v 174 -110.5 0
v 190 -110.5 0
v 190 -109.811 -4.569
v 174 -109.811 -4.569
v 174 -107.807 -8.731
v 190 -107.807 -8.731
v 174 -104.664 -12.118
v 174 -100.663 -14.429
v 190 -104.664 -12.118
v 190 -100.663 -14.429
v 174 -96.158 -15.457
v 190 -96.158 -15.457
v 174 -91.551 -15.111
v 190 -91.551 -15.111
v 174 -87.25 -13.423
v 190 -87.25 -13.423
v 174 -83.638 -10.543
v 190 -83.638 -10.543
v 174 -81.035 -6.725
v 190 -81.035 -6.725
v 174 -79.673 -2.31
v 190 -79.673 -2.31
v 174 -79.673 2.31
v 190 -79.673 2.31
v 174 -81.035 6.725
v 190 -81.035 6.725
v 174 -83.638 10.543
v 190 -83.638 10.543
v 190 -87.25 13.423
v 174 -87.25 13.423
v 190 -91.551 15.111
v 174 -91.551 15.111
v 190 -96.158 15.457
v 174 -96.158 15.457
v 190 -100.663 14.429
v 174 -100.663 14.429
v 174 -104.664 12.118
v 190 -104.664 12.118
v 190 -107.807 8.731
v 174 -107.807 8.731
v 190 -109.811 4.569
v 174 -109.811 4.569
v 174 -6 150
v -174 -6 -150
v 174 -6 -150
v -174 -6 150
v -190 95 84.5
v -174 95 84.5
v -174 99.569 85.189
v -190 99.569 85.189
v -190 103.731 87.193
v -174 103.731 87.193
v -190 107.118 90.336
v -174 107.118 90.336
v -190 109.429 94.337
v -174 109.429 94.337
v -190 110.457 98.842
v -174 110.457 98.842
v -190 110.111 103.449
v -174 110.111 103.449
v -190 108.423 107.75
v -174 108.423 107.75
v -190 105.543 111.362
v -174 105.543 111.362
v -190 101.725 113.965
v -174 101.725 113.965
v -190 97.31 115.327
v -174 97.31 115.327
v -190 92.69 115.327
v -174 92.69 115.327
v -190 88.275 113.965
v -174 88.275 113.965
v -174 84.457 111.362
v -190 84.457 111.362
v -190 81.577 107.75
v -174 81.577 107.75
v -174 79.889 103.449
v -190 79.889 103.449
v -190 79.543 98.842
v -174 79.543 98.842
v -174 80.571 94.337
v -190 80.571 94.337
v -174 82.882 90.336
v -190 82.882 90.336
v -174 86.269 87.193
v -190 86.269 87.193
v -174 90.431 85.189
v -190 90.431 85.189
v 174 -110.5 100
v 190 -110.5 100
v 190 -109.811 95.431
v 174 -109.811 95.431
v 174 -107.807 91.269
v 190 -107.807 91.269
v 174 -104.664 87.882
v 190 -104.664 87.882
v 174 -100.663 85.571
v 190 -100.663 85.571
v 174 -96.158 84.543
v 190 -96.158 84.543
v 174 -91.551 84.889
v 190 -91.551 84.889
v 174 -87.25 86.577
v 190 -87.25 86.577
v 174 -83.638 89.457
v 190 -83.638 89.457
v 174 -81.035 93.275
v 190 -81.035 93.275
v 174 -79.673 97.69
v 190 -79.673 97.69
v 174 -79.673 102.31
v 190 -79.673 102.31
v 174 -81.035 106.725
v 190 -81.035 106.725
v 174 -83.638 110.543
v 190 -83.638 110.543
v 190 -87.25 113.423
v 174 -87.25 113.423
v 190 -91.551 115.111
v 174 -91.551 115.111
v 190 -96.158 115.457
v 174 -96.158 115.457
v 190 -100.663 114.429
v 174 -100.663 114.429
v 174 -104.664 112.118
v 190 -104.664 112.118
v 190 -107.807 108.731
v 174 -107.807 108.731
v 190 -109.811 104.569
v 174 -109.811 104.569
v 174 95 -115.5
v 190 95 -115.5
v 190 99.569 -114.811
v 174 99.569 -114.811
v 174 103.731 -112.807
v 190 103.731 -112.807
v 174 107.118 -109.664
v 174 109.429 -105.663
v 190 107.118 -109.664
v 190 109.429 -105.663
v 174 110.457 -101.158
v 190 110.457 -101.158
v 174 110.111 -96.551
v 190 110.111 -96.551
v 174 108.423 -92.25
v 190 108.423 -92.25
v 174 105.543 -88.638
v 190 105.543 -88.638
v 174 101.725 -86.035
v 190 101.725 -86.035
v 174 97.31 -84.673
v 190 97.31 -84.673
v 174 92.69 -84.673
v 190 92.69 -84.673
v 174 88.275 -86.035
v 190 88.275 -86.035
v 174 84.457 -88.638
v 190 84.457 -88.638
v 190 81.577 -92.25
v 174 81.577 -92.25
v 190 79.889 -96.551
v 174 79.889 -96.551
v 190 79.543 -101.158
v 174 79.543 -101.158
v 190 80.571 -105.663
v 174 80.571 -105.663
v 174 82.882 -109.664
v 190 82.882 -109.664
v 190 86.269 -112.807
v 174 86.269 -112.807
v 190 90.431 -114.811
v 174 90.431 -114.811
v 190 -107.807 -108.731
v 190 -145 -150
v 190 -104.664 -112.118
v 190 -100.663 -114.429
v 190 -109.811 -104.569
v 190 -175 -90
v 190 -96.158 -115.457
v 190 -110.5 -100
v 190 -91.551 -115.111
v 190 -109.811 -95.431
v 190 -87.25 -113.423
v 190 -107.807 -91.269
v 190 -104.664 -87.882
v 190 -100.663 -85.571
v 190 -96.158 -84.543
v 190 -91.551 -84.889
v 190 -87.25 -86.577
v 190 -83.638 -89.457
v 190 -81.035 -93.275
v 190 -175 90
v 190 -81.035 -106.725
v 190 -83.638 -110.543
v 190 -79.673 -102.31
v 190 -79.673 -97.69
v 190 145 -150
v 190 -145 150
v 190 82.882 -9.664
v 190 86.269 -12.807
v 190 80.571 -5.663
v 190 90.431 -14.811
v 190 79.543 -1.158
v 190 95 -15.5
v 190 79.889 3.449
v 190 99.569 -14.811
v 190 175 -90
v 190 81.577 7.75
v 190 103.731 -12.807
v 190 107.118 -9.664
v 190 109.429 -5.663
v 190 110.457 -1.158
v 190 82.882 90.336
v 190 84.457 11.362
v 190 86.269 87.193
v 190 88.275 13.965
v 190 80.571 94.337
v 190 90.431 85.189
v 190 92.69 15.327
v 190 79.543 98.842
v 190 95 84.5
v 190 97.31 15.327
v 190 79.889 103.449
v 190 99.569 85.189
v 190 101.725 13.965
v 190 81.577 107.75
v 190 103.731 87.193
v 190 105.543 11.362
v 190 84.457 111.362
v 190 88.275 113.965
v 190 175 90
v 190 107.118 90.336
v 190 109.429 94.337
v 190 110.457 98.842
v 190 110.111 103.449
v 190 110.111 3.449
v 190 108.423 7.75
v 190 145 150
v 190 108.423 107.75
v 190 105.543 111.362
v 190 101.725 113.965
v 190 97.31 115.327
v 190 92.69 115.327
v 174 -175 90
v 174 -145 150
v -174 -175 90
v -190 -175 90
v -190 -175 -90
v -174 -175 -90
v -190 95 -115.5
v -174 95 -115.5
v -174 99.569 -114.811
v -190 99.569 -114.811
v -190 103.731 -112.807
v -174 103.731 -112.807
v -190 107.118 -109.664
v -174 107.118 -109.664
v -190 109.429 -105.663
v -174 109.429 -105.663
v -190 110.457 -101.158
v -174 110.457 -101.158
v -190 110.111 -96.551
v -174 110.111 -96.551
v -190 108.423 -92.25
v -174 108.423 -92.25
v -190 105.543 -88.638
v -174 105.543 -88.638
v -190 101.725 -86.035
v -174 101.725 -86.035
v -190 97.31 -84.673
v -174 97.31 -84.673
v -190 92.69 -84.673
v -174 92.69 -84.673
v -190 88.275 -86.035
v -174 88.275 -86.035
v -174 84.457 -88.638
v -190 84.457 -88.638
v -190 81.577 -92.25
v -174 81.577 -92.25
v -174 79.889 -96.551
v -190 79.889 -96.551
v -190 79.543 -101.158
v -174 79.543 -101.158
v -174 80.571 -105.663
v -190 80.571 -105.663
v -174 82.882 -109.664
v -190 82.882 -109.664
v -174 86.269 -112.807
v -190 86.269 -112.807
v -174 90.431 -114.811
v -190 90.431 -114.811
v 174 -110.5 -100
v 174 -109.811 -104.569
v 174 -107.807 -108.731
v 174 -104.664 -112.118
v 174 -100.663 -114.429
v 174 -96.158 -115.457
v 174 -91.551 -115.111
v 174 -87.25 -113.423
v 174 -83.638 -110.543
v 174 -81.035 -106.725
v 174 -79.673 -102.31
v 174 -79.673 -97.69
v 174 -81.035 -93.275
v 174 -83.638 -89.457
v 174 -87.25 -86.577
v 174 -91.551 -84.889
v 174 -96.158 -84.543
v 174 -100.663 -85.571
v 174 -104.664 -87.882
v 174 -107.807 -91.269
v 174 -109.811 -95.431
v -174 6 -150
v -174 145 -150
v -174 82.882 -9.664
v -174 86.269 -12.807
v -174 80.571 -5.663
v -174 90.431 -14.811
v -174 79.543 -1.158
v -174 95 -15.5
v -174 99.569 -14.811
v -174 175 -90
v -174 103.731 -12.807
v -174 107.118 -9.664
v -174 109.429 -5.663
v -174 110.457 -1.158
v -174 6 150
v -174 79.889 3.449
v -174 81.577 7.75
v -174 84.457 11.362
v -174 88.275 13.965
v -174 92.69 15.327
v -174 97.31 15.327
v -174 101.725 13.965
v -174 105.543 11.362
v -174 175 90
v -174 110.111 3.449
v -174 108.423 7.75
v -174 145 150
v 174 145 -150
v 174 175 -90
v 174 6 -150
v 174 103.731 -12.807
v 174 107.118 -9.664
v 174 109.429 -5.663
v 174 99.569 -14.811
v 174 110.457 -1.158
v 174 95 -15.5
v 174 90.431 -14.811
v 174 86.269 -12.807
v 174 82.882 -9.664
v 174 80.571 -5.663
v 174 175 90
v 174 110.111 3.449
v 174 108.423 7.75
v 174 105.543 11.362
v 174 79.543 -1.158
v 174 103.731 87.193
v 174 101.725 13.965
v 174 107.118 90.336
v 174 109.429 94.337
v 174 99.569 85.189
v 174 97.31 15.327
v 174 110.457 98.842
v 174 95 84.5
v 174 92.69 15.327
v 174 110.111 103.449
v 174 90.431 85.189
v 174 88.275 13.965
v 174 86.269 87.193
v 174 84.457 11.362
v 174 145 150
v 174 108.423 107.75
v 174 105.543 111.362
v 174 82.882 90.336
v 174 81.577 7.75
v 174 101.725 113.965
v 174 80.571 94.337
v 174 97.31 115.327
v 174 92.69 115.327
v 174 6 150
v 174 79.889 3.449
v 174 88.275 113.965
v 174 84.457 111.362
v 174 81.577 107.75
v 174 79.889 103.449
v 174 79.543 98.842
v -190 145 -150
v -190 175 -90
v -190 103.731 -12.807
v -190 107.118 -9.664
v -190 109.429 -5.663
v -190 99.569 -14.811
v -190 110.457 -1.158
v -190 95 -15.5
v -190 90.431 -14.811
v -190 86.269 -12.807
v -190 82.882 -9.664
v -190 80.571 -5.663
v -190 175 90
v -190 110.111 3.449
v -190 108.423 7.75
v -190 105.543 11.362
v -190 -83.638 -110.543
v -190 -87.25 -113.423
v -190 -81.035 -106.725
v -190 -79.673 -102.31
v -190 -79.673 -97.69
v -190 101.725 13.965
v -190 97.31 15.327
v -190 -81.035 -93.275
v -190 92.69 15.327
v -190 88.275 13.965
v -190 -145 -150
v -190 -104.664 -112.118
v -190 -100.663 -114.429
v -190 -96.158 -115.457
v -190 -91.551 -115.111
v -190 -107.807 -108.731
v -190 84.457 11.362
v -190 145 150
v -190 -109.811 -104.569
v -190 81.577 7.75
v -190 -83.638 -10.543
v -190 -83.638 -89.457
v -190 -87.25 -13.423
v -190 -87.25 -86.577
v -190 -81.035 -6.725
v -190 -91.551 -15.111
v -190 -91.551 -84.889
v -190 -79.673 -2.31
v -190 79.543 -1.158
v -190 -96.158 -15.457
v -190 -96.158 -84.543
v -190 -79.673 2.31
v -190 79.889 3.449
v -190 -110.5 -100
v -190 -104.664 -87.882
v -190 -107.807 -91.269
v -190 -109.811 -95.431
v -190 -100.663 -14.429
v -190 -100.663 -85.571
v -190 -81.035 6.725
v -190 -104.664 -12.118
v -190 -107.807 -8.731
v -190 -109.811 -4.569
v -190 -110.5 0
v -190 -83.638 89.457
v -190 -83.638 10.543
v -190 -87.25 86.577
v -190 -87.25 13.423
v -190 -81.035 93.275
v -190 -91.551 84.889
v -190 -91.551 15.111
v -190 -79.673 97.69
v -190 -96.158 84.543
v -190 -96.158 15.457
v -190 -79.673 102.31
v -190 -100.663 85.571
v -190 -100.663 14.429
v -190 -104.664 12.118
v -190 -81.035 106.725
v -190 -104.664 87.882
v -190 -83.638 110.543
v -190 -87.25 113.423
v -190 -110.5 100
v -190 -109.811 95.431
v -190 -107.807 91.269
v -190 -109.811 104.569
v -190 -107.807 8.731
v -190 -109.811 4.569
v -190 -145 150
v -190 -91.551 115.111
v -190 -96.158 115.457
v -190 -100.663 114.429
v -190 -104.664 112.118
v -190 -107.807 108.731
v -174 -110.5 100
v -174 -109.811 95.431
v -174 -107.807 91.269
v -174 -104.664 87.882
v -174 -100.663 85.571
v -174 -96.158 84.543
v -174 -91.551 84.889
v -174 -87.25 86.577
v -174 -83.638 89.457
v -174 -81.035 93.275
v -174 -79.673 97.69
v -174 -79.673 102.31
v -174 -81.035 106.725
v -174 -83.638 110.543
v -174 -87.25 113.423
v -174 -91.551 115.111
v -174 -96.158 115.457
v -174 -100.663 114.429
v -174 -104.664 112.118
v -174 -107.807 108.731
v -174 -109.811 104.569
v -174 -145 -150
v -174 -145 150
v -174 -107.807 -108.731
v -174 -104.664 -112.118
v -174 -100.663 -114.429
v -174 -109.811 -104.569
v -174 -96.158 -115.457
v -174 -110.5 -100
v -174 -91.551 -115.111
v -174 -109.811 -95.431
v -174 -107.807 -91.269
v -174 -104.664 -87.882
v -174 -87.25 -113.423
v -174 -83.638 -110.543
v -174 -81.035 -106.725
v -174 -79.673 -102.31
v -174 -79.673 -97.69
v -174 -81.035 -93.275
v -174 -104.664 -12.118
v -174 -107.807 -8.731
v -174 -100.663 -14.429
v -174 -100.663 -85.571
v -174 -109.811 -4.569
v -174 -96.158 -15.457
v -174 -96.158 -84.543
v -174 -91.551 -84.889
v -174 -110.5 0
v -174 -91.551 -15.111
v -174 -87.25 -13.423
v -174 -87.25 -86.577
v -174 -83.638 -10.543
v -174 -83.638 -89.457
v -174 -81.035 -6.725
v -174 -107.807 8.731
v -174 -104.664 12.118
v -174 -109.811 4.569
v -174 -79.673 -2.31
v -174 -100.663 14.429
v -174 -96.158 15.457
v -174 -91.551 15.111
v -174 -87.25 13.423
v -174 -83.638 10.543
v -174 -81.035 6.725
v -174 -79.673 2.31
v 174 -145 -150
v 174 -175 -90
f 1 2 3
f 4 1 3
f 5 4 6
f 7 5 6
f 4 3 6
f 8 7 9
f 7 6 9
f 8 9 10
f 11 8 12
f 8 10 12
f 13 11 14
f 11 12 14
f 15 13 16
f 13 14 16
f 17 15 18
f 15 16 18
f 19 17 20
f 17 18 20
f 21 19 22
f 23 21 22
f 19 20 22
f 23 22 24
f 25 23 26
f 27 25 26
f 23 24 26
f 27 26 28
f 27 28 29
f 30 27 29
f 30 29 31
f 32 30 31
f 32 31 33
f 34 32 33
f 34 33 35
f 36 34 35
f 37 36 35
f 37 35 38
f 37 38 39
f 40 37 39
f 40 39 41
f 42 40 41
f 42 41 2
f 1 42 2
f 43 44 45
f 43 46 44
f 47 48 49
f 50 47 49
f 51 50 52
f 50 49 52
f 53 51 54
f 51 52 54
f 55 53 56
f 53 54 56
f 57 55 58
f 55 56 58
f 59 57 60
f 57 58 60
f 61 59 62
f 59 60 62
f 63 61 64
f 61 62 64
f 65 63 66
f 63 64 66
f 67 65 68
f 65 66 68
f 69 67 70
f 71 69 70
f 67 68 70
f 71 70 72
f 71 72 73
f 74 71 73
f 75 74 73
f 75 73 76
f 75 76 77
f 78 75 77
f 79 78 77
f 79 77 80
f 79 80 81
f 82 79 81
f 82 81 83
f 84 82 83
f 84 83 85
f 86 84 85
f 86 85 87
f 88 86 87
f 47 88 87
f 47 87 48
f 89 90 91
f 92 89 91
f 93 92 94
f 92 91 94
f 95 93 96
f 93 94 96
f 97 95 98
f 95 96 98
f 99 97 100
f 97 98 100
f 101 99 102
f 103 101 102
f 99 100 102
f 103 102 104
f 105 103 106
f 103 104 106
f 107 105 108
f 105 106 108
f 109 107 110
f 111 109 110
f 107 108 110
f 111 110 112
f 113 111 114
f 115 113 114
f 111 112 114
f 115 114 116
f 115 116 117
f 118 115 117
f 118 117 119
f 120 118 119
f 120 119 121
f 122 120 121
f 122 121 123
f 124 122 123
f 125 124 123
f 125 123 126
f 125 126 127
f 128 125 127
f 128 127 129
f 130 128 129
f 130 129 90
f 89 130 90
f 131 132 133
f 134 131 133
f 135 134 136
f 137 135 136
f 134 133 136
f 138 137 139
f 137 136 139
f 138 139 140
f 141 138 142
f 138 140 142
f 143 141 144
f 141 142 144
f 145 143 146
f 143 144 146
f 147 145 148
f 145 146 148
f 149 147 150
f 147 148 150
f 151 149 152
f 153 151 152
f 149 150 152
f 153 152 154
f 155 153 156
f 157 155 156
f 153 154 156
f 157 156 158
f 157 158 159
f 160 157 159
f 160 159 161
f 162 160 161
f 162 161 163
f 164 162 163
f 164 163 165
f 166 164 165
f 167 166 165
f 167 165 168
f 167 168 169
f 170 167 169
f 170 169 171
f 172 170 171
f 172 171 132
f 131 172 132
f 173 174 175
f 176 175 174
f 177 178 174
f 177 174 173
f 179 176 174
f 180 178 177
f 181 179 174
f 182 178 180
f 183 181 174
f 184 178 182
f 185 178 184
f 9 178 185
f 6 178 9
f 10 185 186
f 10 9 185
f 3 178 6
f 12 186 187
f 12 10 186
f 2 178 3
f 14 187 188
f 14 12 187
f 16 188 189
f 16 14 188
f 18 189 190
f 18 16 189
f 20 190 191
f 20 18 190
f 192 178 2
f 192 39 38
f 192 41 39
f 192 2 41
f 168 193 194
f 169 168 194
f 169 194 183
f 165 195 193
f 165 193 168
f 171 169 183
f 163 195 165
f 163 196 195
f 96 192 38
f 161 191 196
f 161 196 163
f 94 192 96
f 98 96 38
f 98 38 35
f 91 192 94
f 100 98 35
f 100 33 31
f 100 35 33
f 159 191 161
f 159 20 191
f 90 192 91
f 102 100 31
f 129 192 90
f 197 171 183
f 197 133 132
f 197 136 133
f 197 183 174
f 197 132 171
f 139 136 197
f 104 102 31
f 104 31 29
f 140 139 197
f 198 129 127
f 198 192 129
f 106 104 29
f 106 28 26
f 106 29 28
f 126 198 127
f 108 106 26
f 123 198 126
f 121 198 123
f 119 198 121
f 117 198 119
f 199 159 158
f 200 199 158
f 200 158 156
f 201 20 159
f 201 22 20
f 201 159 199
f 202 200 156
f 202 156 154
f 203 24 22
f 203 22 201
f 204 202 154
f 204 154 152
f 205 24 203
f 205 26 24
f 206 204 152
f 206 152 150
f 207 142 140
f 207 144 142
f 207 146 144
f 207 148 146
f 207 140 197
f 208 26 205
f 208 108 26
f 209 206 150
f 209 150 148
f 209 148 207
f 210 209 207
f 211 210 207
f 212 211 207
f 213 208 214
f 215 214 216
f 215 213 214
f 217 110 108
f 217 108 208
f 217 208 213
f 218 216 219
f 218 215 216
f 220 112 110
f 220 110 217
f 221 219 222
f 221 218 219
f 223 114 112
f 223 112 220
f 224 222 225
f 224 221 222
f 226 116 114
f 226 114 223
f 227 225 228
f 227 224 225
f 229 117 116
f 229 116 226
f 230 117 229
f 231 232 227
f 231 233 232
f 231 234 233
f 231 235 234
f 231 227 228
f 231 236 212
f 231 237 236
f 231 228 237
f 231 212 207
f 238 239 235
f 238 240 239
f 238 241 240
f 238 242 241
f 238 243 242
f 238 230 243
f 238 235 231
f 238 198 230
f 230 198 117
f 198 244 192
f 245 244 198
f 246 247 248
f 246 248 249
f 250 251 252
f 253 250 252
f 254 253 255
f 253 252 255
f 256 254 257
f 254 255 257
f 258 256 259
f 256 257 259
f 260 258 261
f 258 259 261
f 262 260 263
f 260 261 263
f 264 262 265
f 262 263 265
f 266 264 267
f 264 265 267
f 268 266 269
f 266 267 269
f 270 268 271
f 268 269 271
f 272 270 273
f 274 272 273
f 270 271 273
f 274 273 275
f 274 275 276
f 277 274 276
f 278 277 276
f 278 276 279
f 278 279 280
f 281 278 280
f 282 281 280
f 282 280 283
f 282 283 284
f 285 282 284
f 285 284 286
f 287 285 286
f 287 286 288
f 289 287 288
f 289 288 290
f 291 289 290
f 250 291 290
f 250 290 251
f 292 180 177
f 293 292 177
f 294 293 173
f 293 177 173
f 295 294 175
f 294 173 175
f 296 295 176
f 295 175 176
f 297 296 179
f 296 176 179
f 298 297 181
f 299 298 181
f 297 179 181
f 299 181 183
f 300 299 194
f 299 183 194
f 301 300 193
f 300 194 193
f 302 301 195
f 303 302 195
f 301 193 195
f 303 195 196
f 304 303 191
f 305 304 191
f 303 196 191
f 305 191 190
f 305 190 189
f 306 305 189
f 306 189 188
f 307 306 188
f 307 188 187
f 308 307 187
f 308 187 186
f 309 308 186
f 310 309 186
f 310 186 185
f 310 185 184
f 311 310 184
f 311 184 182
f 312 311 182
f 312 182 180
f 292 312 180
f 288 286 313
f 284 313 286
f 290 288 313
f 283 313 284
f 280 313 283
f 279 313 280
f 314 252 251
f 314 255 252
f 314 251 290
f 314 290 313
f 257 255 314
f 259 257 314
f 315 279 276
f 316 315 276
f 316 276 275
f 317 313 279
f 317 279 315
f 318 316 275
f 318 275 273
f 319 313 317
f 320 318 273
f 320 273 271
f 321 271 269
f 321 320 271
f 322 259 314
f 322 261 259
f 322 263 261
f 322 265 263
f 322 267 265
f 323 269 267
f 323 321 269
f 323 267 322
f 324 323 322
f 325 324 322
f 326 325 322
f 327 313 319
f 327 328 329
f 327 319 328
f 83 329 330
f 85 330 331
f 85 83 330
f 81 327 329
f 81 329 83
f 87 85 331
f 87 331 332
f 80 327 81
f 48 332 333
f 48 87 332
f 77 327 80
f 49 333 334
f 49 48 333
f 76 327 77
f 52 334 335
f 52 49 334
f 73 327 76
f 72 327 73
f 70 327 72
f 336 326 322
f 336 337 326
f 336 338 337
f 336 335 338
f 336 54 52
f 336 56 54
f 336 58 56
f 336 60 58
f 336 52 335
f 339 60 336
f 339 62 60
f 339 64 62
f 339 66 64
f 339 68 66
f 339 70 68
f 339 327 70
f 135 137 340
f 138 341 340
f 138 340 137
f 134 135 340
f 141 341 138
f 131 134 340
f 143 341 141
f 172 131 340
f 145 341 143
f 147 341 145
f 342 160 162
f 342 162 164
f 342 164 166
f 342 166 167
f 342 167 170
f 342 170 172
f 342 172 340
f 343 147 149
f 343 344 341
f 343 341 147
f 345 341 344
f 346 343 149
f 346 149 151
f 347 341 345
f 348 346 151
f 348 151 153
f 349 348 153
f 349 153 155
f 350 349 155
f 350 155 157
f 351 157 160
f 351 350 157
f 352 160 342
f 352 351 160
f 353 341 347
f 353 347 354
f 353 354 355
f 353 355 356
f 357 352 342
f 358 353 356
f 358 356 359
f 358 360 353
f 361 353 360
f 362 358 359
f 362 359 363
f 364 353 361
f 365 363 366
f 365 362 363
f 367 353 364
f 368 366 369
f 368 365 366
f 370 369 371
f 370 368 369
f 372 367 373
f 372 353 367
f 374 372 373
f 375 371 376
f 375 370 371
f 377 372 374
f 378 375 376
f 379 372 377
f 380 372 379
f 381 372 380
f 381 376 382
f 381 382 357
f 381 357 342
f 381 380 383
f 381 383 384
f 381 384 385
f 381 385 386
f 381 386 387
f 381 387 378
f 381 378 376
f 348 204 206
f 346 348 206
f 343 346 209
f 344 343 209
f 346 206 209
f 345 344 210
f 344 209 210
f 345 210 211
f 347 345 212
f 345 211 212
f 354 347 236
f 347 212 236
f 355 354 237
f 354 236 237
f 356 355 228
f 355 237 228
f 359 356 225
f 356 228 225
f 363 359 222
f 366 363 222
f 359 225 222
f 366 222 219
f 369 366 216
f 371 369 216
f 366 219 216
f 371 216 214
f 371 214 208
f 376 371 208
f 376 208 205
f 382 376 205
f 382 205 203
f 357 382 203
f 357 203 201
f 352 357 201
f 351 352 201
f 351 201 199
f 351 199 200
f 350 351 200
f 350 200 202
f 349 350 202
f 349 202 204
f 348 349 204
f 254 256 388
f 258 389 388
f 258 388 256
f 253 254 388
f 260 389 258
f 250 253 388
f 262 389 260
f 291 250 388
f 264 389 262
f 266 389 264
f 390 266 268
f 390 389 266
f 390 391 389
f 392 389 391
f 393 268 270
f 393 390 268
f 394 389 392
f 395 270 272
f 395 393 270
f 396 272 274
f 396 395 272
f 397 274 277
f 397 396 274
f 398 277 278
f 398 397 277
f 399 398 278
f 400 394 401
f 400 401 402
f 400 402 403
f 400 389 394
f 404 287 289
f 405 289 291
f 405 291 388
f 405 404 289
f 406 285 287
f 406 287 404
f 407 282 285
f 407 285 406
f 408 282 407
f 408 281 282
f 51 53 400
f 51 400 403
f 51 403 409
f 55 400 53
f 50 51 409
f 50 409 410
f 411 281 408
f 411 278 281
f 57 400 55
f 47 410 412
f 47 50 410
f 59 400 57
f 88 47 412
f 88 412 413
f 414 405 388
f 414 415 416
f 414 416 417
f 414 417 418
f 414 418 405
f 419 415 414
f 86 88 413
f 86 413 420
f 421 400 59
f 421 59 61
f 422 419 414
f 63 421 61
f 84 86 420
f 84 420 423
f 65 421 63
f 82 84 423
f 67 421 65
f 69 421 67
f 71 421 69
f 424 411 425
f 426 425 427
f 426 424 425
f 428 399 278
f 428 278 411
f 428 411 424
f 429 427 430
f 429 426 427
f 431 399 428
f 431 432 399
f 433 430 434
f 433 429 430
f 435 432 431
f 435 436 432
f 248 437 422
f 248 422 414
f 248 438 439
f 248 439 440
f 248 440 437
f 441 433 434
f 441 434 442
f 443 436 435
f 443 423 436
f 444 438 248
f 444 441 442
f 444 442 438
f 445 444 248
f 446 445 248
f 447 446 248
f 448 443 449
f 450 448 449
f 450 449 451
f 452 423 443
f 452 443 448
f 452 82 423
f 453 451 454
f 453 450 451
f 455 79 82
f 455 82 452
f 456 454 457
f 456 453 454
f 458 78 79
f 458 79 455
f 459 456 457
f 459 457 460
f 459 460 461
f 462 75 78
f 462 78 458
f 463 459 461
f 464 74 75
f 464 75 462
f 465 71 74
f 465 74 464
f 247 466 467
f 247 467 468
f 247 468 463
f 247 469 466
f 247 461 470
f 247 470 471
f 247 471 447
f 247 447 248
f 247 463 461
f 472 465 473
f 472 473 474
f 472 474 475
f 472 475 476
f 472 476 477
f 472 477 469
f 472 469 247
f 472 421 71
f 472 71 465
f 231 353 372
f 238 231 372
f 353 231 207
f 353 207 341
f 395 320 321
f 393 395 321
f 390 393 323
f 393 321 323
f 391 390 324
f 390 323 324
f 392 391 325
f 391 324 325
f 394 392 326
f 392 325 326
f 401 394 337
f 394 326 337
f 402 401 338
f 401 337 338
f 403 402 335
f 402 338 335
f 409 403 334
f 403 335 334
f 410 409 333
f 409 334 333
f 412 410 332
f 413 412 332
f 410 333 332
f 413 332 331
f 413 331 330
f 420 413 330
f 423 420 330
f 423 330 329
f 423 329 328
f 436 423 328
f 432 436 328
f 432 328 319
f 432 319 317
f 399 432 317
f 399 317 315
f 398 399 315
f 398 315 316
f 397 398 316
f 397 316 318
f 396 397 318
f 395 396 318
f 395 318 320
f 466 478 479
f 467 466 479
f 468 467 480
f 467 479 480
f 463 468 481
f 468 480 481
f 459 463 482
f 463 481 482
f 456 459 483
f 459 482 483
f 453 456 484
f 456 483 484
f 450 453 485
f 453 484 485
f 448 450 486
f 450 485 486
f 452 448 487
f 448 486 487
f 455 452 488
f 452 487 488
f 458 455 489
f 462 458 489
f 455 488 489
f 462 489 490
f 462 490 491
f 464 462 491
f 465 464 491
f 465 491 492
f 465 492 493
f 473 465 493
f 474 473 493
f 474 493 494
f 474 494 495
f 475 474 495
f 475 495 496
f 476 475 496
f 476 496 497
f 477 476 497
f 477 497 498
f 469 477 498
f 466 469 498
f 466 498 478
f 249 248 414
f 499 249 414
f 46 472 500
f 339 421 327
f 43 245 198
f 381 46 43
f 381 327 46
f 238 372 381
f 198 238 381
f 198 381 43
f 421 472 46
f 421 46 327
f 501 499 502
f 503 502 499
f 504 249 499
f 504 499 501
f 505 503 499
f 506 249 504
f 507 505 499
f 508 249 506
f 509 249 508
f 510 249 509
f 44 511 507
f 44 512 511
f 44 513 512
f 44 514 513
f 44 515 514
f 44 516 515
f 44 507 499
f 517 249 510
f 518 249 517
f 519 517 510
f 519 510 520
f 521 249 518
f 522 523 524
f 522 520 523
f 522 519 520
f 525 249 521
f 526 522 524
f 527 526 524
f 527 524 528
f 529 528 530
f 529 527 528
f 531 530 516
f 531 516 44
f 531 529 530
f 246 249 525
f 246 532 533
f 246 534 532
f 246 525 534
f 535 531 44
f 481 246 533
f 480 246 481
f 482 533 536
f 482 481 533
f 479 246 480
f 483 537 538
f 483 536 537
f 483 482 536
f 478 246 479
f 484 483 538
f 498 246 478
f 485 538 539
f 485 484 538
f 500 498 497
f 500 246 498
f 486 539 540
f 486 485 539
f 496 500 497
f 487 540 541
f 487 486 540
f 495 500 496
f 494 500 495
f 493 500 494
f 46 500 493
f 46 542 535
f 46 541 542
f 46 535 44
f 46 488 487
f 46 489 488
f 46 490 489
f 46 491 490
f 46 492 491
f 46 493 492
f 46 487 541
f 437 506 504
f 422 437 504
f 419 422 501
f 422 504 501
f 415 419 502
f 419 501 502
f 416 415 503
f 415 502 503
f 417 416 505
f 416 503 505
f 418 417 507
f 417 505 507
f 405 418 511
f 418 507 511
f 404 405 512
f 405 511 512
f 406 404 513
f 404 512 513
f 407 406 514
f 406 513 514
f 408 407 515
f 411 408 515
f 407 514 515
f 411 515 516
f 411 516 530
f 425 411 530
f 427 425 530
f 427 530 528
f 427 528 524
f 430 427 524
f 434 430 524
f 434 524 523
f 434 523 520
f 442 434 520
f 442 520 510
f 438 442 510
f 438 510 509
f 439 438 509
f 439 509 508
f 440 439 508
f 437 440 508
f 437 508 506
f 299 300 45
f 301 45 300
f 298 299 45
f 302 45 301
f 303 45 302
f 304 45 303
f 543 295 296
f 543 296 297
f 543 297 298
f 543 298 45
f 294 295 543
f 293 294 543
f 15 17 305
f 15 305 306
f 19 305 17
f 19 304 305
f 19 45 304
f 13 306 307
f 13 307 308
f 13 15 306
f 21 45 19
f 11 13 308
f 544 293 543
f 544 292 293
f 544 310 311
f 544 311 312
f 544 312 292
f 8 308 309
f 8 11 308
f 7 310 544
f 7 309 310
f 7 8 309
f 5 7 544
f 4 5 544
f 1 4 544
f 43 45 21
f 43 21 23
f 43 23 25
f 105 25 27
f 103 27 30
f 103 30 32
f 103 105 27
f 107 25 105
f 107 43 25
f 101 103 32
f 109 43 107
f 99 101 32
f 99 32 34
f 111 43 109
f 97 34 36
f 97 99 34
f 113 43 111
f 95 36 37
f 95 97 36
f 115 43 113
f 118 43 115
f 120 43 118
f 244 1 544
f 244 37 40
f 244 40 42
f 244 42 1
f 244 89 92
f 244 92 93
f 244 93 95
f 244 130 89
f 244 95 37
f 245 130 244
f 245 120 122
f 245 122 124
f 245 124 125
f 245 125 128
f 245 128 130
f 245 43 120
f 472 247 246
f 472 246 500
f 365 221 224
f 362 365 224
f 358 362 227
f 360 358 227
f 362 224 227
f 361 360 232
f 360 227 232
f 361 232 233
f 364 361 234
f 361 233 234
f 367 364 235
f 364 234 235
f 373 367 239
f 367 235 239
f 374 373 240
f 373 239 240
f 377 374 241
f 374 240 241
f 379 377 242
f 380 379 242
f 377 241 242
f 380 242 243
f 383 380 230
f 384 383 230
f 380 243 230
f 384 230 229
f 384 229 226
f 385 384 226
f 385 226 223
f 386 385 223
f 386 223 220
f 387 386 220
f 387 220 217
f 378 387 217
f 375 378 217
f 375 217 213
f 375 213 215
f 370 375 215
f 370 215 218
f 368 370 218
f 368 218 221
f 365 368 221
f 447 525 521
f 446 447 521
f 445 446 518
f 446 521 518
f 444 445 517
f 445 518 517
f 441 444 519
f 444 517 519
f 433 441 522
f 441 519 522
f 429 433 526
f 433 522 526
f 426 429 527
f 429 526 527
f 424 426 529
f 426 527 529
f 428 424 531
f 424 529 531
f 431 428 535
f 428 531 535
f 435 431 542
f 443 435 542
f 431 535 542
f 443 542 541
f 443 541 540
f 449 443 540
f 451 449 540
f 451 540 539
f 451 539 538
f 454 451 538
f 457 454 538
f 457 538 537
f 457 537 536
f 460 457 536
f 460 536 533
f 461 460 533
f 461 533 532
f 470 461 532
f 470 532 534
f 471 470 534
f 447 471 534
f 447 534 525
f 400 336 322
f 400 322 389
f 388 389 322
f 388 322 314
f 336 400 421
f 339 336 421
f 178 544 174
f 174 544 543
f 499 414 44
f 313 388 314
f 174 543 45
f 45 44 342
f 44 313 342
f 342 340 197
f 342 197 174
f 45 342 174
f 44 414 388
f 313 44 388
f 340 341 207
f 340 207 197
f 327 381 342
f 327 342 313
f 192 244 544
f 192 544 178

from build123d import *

# Parameters (mm, degrees)
EXTRUDE_1_DEPTH          = 150
SKETCH_2_R               = 15.5
CUT_EXTRUDE_7_DEPTH      = 445.437847173
CUT_EXTRUDE_8_DEPTH      = 299.705540625
CUT_EXTRUDE_8_DEPTH_BACK = 299.705540625


with BuildPart() as part:
    # 草图1 → 拉伸1 (new, symmetric)
    with BuildSketch(Plane.XY):
        Polygon((-174, -6), (174, -6), (174, -175), (190, -175), (190, 175), (174, 175), (174, 6), (-174, 6), (-174, 175), (-190, 175), (-190, -175), (-174, -175), align=None)
    extrude(amount=EXTRUDE_1_DEPTH, both=True)

    # 草图2 → 拉伸7 (cut, through all)
    with BuildSketch(Plane(origin=(190, 0, 0), x_dir=(0, 0, -1), z_dir=(1, 0, 0))):
        with Locations((-100, 95)):
            Circle(SKETCH_2_R)
        with Locations((0, 95)):
            Circle(SKETCH_2_R)
        with Locations((100, 95)):
            Circle(SKETCH_2_R)
        with Locations(Location((100, -95, 0), (0, 0, 270))):
            Circle(SKETCH_2_R)
        with Locations(Location((0, -95, 0), (0, 0, 270))):
            Circle(SKETCH_2_R)
        with Locations(Location((-100, -95, 0), (0, 0, 270))):
            Circle(SKETCH_2_R)
    extrude(amount=-CUT_EXTRUDE_7_DEPTH, mode=Mode.SUBTRACT)

    # 草图3 → 拉伸8 (cut, two sides: drawn at the far end of the back side and taken through both)
    with BuildSketch(Plane(origin=(0, 0, 0), x_dir=(0, 0, -1), z_dir=(1, 0, 0)).offset(-CUT_EXTRUDE_8_DEPTH_BACK)):
        Polygon((-150, 175), (-90, 175), (-150, 145), align=None)
        Polygon((150, 145), (150, 175), (90, 175), align=None)
        Polygon((150, -175), (90, -175), (150, -145), align=None)
        Polygon((-150, -145), (-150, -175), (-90, -175), align=None)
    extrude(amount=CUT_EXTRUDE_8_DEPTH + CUT_EXTRUDE_8_DEPTH_BACK, mode=Mode.SUBTRACT)


solid = part.part
